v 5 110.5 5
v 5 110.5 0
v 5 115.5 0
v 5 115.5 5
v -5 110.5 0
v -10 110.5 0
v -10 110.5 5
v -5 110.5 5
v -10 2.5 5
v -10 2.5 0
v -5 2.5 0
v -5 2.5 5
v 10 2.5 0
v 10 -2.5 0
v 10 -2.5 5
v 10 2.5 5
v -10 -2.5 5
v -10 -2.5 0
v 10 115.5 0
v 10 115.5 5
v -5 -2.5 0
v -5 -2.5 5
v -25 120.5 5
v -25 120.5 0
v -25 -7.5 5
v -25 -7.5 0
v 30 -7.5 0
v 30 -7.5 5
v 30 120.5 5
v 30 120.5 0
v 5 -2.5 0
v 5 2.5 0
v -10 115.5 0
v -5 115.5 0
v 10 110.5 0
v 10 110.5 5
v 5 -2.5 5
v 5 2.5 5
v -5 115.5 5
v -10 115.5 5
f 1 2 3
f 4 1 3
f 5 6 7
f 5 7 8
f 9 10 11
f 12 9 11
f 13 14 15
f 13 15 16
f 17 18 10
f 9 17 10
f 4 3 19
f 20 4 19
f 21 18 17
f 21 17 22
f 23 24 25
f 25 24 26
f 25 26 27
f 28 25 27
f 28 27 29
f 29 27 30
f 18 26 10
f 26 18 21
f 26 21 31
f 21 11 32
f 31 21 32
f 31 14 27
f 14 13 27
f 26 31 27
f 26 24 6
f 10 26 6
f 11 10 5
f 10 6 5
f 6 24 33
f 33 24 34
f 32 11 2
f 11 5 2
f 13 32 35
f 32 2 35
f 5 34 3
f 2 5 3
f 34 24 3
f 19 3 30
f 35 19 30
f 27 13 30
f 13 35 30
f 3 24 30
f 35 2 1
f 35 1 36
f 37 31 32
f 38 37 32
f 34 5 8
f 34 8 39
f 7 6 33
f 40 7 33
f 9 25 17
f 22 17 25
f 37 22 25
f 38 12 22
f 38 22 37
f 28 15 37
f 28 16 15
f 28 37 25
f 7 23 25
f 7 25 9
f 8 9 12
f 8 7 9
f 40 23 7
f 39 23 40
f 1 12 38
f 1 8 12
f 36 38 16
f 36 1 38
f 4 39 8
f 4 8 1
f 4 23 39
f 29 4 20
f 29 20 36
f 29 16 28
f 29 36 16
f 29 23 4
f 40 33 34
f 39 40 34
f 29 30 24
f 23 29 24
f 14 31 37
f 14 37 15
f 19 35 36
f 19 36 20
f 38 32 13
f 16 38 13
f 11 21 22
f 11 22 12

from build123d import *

# Parameters (mm, degrees)
ESQUISSE1_W        = 5
ESQUISSE1_H        = 5
BOSS_EXTRU_1_DEPTH = 5


with BuildPart() as part:
    # Esquisse1 → Boss.-Extru.1 (new body)
    with BuildSketch(Plane.XY):
        Polygon((25, 120.5), (-25, 120.5), (-25, 56.5), (-25, -7.5), (25, -7.5), (30, -7.5), (30, 120.5), align=None)
        with Locations((-7.5, 0)):
            Rectangle(ESQUISSE1_W, ESQUISSE1_H, mode=Mode.SUBTRACT)
        with Locations((7.5, 0)):
            Rectangle(ESQUISSE1_W, ESQUISSE1_H, mode=Mode.SUBTRACT)
        with Locations((-7.5, 113)):
            Rectangle(ESQUISSE1_W, ESQUISSE1_H, mode=Mode.SUBTRACT)
        with Locations((7.5, 113)):
            Rectangle(ESQUISSE1_W, ESQUISSE1_H, mode=Mode.SUBTRACT)
    extrude(amount=BOSS_EXTRU_1_DEPTH)


solid = part.part
